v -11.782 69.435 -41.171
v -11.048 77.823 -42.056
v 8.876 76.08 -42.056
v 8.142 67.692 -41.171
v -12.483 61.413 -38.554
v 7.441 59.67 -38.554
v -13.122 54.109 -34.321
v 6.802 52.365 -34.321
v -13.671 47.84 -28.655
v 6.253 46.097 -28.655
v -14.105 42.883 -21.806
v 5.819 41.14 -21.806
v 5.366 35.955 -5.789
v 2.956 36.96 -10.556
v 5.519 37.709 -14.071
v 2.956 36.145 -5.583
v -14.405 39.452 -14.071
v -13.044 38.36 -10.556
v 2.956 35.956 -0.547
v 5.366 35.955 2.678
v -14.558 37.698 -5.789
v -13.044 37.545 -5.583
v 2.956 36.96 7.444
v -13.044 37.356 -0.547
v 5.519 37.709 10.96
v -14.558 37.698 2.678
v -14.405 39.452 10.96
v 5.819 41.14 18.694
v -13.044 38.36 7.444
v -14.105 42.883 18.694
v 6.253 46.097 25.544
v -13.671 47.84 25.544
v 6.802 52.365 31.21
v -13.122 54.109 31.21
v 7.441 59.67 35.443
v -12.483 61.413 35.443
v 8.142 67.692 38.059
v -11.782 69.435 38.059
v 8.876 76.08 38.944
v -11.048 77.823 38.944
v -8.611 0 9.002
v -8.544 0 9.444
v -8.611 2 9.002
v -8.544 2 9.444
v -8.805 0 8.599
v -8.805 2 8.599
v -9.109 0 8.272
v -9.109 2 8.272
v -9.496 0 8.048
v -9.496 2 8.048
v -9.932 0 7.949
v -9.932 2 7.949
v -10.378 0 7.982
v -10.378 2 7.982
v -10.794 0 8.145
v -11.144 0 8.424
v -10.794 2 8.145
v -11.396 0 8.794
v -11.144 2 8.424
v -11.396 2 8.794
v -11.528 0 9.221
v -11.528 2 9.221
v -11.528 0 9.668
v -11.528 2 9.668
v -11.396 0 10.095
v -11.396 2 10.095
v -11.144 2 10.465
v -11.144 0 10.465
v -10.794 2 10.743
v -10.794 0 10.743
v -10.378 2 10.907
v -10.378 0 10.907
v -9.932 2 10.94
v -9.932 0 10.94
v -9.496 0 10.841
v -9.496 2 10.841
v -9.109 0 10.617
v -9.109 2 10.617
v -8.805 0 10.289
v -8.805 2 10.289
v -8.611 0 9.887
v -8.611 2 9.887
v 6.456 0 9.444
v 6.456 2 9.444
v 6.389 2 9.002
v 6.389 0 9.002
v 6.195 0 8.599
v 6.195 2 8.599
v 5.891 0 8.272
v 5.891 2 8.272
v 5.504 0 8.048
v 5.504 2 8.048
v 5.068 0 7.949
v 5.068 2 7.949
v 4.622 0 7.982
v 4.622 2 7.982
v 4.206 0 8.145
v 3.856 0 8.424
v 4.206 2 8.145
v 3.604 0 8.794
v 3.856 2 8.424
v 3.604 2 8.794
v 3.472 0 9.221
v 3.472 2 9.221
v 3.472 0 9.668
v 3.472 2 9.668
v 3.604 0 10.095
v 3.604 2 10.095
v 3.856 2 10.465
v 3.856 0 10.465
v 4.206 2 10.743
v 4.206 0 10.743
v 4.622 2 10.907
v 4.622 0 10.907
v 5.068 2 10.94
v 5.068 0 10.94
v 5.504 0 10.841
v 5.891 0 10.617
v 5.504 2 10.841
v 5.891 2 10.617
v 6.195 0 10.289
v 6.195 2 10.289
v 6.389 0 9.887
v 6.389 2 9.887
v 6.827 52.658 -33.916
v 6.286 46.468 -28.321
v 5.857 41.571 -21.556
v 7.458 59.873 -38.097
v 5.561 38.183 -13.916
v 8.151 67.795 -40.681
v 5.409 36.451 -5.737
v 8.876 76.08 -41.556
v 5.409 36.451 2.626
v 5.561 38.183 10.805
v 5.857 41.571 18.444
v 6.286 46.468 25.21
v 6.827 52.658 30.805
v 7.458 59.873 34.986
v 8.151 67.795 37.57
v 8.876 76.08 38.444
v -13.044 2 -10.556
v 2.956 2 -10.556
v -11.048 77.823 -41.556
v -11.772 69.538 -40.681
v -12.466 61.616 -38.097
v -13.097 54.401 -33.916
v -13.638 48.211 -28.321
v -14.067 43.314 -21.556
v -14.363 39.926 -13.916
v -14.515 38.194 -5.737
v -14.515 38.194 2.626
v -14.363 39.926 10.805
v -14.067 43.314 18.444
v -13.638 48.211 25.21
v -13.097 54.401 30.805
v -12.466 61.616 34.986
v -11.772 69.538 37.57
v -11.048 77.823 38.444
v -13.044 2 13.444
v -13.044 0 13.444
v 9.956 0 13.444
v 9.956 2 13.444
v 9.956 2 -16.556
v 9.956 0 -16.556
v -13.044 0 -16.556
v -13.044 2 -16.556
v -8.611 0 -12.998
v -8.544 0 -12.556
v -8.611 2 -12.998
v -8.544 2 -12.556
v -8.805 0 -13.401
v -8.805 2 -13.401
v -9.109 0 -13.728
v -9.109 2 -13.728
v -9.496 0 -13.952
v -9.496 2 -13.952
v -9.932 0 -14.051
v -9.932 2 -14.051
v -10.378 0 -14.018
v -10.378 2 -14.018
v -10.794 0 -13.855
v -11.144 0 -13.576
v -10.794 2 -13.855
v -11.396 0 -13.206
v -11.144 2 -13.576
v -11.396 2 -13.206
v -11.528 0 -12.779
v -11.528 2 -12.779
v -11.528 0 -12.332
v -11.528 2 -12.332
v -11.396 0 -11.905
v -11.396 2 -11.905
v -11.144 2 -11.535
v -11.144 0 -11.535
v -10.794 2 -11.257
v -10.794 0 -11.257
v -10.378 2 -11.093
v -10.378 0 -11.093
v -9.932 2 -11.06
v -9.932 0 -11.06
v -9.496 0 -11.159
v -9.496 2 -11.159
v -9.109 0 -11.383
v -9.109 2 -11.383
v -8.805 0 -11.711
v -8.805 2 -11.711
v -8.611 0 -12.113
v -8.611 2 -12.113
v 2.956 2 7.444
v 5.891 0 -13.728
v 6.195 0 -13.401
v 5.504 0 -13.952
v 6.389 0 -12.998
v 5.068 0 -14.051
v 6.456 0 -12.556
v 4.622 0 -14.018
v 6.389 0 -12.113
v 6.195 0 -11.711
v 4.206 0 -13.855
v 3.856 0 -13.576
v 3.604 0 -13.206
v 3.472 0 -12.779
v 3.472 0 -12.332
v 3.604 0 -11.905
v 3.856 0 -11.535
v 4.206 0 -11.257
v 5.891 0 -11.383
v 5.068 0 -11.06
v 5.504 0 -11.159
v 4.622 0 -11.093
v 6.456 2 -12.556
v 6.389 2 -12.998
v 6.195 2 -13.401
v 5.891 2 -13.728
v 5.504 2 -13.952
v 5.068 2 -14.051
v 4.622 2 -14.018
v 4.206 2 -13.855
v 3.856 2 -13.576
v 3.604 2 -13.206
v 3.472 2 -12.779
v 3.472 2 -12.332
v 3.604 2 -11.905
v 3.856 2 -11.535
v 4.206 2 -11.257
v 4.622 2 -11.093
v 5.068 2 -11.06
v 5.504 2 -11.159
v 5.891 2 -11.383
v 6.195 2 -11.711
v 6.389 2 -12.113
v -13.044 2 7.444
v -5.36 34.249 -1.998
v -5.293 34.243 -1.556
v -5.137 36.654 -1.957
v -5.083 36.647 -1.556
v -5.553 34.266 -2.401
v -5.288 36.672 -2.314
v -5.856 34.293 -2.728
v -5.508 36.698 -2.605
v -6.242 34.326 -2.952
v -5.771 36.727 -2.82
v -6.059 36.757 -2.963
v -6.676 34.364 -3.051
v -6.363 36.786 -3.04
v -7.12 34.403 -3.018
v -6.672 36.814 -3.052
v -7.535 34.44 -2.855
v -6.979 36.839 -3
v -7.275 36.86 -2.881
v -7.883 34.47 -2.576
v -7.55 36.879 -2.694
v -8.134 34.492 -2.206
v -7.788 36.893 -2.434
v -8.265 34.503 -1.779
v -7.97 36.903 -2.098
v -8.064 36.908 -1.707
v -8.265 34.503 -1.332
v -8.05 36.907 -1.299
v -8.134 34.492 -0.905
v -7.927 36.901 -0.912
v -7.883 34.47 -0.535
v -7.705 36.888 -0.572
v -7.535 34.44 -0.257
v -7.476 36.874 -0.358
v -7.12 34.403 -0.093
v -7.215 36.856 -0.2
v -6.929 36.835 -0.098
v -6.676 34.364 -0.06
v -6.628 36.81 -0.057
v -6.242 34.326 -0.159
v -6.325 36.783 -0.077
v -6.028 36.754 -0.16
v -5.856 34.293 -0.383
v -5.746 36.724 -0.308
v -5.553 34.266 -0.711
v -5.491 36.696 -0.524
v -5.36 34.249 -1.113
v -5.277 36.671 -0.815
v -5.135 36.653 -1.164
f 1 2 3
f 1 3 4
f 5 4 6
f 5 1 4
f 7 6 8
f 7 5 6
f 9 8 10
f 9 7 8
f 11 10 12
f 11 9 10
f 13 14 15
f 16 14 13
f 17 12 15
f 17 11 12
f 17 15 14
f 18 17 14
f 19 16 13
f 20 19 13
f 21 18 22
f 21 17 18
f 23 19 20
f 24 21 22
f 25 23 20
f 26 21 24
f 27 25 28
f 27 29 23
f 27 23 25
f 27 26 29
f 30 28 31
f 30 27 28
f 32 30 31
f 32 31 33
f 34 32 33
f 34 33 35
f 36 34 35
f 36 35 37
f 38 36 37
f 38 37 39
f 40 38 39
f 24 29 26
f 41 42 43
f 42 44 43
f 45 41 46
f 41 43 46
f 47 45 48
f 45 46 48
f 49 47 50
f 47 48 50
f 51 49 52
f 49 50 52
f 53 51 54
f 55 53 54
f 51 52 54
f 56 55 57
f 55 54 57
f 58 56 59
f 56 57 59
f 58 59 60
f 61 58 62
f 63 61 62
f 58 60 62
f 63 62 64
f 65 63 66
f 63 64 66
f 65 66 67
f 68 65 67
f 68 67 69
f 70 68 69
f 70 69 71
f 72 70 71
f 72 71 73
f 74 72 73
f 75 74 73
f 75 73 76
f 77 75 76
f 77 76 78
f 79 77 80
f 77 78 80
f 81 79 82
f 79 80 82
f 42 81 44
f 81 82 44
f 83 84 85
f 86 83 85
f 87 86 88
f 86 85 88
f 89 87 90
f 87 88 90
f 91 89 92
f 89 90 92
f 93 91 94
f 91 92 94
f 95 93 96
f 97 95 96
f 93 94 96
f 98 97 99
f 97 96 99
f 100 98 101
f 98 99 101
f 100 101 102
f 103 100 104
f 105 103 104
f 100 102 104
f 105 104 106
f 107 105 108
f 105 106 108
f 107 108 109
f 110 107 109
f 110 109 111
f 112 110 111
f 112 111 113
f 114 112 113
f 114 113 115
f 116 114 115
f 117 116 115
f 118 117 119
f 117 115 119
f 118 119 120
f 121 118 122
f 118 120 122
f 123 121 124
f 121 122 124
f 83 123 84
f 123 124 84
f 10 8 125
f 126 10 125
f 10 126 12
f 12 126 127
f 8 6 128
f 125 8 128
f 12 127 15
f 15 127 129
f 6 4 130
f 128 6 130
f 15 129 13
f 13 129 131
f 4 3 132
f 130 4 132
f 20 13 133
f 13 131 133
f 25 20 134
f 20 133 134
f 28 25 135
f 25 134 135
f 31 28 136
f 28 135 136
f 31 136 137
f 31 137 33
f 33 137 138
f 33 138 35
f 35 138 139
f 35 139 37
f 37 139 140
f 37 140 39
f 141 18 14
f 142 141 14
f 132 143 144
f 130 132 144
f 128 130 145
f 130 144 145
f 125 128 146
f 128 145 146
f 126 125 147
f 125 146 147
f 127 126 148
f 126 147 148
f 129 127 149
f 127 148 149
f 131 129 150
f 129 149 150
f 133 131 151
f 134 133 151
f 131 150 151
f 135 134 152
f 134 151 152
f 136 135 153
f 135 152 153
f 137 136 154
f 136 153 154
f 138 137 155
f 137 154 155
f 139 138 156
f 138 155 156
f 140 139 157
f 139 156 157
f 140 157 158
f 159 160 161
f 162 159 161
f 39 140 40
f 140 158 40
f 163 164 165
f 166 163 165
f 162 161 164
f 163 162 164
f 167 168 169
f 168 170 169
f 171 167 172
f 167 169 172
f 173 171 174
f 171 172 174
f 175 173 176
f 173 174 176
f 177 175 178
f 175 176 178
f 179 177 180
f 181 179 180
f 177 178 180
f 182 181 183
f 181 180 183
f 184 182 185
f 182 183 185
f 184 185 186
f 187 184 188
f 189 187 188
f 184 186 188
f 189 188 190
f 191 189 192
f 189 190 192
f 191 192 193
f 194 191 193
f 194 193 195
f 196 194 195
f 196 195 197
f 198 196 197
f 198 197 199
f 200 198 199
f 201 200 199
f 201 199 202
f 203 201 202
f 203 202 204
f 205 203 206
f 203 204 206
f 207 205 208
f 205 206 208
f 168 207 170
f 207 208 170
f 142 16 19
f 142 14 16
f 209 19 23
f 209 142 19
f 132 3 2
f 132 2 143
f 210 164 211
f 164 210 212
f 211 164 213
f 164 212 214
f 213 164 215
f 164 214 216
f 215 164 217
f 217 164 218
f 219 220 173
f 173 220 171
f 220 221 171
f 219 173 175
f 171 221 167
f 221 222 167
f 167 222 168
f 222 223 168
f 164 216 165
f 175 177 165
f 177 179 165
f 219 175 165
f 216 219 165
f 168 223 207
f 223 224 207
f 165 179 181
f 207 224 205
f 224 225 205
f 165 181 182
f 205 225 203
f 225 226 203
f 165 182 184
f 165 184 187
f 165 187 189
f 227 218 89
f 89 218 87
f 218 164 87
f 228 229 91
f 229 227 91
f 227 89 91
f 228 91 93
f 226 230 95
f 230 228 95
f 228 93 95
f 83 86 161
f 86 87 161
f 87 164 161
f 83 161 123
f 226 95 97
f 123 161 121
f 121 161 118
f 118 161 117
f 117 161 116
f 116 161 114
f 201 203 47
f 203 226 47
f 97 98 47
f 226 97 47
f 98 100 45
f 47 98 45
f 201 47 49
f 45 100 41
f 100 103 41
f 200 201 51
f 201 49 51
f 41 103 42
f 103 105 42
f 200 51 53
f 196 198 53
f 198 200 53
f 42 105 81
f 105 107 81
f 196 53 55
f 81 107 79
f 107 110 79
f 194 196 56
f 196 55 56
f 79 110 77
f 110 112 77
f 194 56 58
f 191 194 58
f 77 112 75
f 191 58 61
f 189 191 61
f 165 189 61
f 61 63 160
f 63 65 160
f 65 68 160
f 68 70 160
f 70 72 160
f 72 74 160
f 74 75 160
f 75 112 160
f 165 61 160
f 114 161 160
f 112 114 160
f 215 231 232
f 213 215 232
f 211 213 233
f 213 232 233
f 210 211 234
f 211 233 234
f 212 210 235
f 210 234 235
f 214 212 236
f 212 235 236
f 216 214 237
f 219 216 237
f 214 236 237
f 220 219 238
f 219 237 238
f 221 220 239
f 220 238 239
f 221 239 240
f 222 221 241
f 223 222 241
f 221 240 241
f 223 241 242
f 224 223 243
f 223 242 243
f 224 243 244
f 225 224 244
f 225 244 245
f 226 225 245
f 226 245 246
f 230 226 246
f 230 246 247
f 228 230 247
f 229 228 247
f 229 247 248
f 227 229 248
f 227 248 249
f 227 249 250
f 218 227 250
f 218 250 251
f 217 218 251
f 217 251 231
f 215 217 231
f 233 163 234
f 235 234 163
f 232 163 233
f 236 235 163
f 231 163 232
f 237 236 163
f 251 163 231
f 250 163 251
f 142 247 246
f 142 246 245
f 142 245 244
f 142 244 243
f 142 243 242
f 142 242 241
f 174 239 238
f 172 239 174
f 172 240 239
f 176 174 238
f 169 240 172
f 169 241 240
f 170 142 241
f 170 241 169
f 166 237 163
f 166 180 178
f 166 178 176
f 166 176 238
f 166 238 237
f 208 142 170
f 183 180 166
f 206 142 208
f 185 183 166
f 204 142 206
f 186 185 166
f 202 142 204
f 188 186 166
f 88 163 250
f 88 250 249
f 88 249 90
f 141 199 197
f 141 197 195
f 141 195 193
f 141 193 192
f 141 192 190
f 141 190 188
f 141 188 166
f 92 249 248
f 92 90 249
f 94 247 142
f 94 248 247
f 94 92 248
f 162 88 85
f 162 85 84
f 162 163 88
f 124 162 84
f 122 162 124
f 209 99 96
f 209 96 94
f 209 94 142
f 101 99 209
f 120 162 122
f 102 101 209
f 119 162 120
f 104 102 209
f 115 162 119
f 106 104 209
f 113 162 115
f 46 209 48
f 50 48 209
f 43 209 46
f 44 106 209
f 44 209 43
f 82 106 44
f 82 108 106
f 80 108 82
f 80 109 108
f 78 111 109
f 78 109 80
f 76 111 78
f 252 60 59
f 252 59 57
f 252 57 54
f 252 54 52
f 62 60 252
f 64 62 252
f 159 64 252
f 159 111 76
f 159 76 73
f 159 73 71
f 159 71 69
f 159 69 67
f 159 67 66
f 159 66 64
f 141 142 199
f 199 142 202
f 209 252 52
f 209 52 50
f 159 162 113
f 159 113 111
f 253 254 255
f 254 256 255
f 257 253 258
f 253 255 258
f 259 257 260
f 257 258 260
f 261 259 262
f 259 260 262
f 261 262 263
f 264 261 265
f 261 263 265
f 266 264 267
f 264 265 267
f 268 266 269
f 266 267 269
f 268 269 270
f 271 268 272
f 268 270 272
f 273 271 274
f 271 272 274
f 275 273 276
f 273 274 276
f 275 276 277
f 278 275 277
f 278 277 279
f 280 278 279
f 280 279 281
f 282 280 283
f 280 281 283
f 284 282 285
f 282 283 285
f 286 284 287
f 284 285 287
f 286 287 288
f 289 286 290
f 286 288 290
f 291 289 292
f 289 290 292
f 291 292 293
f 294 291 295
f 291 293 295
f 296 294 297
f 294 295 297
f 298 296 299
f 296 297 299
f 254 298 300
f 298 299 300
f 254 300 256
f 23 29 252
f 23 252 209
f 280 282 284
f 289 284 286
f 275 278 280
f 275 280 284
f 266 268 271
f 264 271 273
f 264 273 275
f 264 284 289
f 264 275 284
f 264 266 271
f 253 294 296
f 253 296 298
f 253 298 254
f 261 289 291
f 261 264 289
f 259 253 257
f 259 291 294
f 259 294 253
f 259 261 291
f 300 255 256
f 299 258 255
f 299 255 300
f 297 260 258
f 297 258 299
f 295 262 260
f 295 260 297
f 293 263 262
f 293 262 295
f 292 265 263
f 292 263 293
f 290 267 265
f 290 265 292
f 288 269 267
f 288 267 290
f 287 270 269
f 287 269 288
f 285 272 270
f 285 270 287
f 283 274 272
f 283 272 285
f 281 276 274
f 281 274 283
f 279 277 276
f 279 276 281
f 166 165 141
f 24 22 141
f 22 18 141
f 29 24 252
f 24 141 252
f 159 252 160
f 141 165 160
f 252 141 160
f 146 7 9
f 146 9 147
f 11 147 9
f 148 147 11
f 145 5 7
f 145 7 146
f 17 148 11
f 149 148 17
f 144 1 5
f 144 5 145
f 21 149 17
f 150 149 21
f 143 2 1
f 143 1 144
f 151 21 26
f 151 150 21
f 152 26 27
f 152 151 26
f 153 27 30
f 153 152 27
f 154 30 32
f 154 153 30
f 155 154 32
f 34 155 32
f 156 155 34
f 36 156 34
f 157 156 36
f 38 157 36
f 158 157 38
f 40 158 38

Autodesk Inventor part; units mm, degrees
ref_plane "YZ Plane" through (0, 0, 0) normal (1, 0, 0) x (0, 1, 0)
ref_plane "XZ Plane" through (0, 0, 0) normal (0, 1, 0) x (-1, 0, 0)
sketch "草图1" plane through (0, 0, 0) normal (0, 1, 0) x (-1, 0, 0)
  line L0 (20.0444, 13.4444) -> (-9.9556, 13.4444)
  line L1 (-9.9556, 13.4444) -> (-9.9556, -16.5556)
  line L2 (-9.9556, -16.5556) -> (20.0444, -16.5556)
  line L3 (20.0444, -16.5556) -> (20.0444, 13.4444)
  line L4 (0.0444, 13.4444) -> (-7.4556, 13.4444)
  line L5 (0.0444, 13.4444) -> (7.5444, 13.4444)
  dimension "d0" = 30
  dimension "d1" = 30
extrude "拉伸1" add sketch "草图1" along normal blind 2
sketch "草图2" plane through (0, 2, 0) normal (0, 1, 0) x (1, 0, 0)
  line L0 (9.9556, 16.5556) -> (-20.0444, 16.5556) projected
  circle A0 centre (4.9556, 12.5556) radius 1.5
  circle A1 centre (-10.0444, 12.5556) radius 1.5
  circle A2 centre (-10.0444, -9.4444) radius 1.5
  circle A3 centre (4.9556, -9.4444) radius 1.5
  line L1 (-10.0444, 12.5556) -> (-10.0444, 16.5556)
  line L2 (4.9556, 12.5556) -> (4.9556, 16.5556)
  line L3 (-10.0444, -9.4444) -> (-10.0444, -13.4444)
  line L4 (-20.0444, -13.4444) -> (9.9556, -13.4444) projected
  line L5 (4.9556, -9.4444) -> (4.9556, -13.4444)
  line L6 (9.9556, -13.4444) -> (9.9556, 16.5556) projected
  line L7 (-20.0444, 16.5556) -> (-20.0444, -13.4444) projected
  point P0 (0, 0)
  dimension "d15" = 3
  dimension "d16" = 3
  dimension "d17" = 3
  dimension "d108" = 4
  dimension "d109" = 4
  dimension "d110" = 4
  dimension "d111" = 4
  dimension "d112" = 5
  dimension "d113" = 10
extrude "拉伸2" cut sketch "草图2" against normal blind 2 contours A0 | A1 | A2 | A3
sketch "草图3" plane through (0, 2, 0) normal (0, 1, 0) x (1, 0, 0)
  circle A0 centre (4.9556, 12.5556) radius 1.5 projected
  circle A1 centre (-10.0444, -9.4444) radius 1.5 projected
  line L0 (2.9556, 10.5556) -> (2.9556, -7.4444)
  line L1 (-13.0444, 10.5556) -> (-13.0444, -7.4444)
  line L2 (-13.0444, -7.4444) -> (2.9556, -7.4444)
  line L3 (-13.0444, 10.5556) -> (2.9556, 10.5556)
  line L4 (-22.598, 1.5556) -> (13.9828, 1.5556)
  point P0 (0, 0)
  dimension "d137" = 11
extrude "拉伸3" add sketch "草图3" along normal blind 53 contours L0 L4 L1 L3 | L0 L2 L1 L4
chamfer "倒角5" distance 16 angle 5 1 edges at (2.9556, 55, -1.5556) measured on face at (-2.3778, 55, 1.4444)
sketch "草图29" plane through (0, 2, 0) normal (0, 1, 0) x (1, 0, 0)
  line L0 (-13.0444, -7.4444) -> (-13.0444, 10.5556) projected
  line L1 (-13.0444, 10.5556) -> (-20.9964, 10.5556)
  line L2 (-20.9964, 10.5556) -> (-20.9964, -16.1821)
  line L3 (-20.9964, -16.1821) -> (-13.0444, -16.1821)
  line L4 (-13.0444, -16.1821) -> (-13.0444, 10.5556)
  line L5 (-13.0444, 10.5556) -> (-22.8537, 10.5556)
  line L6 (-22.8537, 10.5556) -> (-22.8537, 28.4787)
  line L7 (-22.8537, 28.4787) -> (-13.0444, 28.4787)
  line L8 (-13.0444, 28.4787) -> (-13.0444, 10.5556)
  point P0 (0, 0)
  point P1 (-20.0444, -13.4444)
extrude "拉伸15" cut sketch "草图29" against normal blind 20
sketch "草图31" plane through (-13.0444, 55, 7.4444) normal (0.0872, 0.9962, 0) x (0.9962, -0.0872, 0)
  line L0 (0, 18) -> (0, 0) projected
  line L1 (0, 9) -> (16.0611, 9)
  line L2 (16.0611, 0) -> (16.0611, 18) projected
  circle A0 centre (8.0306, 9) radius 1.5
  point P0 (17.7884, 7.4444)
  dimension "d134" = 3
extrude "拉伸16" cut sketch "草图31" against normal blind 20
ref_plane "工作平面4" through (-13.0444, 55, -10.5556) normal (-0.9962, 0.0872, 0) x (0, 0, 1)
ref_plane "工作平面3" through (2.9556, 53.6002, -1.5556) normal (0.0872, 0.9962, 0) x (0.9962, -0.0872, 0)
sketch "草图36" plane through (-13.0444, 55, -10.5556) normal (-0.9962, 0.0872, 0) x (0, 0, 1)
  line L0 (18, 0) -> (0, 0) projected
  circle A0 centre (9, 0) radius 15
  point P0 (10.5556, -53.6538)
  dimension "d140" = 30
extrude "拉伸17" cut sketch "草图36" against normal blind 200
sketch "草图38" plane through (-13.0444, 55, -10.5556) normal (-0.9962, 0.0872, 0) x (0, 0, 1)
  line L0 (9, -17.5895) -> (9, 63.4105)
  circle A0 centre (9, 22.9105) radius 40.5
  point P0 (10.5556, -53.6538)
  dimension "d143" = 81
extrude "拉伸18" add sketch "草图38" against normal blind 20
sketch "草图39" plane through (-11.0477, 77.8233, -1.5556) normal (-0.9962, 0.0872, 0) x (0, 0, 1)
  line L0 (-48.0605, 0) -> (68.7188, 0)
  line L1 (68.7188, 0) -> (68.7188, 57.1611)
  line L2 (68.7188, 57.1611) -> (-48.0605, 57.1611)
  line L3 (-48.0605, 57.1611) -> (-48.0605, 0)
  point P0 (1.5556, -76.5643)
extrude "拉伸19" cut sketch "草图39" against normal through all
sketch "草图41" plane through (-13.0444, 55, -10.5556) normal (-0.9962, 0.0872, 0) x (0, 0, 1)
  line L0 (49.5, 22.9105) -> (-31.5, 22.9105) projected
  circle A0 centre (9, 22.9105) radius 40
  point P0 (10.5556, -53.6538)
  dimension "d148" = 80
extrude "拉伸20" cut sketch "草图41" against normal blind 20
equation "\"折弯半径\" = 厚度"
equation "\"折弯释压宽度\" = 厚度"
equation "\"折弯释压深度\" = 0.5 * 厚度"
equation "\"拐角释压尺寸\" = 4 * 厚度"
equation "\"最小余量\" = 2 * 厚度"
equation "\"过渡半径\" = 折弯半径"
equation "\"Jacobi半径尺寸\" = 折弯半径"
equation "\"间隙大小\" = 厚度"
equation "\"厚度\" = 0.5"
properties part number "_3D 打印"
